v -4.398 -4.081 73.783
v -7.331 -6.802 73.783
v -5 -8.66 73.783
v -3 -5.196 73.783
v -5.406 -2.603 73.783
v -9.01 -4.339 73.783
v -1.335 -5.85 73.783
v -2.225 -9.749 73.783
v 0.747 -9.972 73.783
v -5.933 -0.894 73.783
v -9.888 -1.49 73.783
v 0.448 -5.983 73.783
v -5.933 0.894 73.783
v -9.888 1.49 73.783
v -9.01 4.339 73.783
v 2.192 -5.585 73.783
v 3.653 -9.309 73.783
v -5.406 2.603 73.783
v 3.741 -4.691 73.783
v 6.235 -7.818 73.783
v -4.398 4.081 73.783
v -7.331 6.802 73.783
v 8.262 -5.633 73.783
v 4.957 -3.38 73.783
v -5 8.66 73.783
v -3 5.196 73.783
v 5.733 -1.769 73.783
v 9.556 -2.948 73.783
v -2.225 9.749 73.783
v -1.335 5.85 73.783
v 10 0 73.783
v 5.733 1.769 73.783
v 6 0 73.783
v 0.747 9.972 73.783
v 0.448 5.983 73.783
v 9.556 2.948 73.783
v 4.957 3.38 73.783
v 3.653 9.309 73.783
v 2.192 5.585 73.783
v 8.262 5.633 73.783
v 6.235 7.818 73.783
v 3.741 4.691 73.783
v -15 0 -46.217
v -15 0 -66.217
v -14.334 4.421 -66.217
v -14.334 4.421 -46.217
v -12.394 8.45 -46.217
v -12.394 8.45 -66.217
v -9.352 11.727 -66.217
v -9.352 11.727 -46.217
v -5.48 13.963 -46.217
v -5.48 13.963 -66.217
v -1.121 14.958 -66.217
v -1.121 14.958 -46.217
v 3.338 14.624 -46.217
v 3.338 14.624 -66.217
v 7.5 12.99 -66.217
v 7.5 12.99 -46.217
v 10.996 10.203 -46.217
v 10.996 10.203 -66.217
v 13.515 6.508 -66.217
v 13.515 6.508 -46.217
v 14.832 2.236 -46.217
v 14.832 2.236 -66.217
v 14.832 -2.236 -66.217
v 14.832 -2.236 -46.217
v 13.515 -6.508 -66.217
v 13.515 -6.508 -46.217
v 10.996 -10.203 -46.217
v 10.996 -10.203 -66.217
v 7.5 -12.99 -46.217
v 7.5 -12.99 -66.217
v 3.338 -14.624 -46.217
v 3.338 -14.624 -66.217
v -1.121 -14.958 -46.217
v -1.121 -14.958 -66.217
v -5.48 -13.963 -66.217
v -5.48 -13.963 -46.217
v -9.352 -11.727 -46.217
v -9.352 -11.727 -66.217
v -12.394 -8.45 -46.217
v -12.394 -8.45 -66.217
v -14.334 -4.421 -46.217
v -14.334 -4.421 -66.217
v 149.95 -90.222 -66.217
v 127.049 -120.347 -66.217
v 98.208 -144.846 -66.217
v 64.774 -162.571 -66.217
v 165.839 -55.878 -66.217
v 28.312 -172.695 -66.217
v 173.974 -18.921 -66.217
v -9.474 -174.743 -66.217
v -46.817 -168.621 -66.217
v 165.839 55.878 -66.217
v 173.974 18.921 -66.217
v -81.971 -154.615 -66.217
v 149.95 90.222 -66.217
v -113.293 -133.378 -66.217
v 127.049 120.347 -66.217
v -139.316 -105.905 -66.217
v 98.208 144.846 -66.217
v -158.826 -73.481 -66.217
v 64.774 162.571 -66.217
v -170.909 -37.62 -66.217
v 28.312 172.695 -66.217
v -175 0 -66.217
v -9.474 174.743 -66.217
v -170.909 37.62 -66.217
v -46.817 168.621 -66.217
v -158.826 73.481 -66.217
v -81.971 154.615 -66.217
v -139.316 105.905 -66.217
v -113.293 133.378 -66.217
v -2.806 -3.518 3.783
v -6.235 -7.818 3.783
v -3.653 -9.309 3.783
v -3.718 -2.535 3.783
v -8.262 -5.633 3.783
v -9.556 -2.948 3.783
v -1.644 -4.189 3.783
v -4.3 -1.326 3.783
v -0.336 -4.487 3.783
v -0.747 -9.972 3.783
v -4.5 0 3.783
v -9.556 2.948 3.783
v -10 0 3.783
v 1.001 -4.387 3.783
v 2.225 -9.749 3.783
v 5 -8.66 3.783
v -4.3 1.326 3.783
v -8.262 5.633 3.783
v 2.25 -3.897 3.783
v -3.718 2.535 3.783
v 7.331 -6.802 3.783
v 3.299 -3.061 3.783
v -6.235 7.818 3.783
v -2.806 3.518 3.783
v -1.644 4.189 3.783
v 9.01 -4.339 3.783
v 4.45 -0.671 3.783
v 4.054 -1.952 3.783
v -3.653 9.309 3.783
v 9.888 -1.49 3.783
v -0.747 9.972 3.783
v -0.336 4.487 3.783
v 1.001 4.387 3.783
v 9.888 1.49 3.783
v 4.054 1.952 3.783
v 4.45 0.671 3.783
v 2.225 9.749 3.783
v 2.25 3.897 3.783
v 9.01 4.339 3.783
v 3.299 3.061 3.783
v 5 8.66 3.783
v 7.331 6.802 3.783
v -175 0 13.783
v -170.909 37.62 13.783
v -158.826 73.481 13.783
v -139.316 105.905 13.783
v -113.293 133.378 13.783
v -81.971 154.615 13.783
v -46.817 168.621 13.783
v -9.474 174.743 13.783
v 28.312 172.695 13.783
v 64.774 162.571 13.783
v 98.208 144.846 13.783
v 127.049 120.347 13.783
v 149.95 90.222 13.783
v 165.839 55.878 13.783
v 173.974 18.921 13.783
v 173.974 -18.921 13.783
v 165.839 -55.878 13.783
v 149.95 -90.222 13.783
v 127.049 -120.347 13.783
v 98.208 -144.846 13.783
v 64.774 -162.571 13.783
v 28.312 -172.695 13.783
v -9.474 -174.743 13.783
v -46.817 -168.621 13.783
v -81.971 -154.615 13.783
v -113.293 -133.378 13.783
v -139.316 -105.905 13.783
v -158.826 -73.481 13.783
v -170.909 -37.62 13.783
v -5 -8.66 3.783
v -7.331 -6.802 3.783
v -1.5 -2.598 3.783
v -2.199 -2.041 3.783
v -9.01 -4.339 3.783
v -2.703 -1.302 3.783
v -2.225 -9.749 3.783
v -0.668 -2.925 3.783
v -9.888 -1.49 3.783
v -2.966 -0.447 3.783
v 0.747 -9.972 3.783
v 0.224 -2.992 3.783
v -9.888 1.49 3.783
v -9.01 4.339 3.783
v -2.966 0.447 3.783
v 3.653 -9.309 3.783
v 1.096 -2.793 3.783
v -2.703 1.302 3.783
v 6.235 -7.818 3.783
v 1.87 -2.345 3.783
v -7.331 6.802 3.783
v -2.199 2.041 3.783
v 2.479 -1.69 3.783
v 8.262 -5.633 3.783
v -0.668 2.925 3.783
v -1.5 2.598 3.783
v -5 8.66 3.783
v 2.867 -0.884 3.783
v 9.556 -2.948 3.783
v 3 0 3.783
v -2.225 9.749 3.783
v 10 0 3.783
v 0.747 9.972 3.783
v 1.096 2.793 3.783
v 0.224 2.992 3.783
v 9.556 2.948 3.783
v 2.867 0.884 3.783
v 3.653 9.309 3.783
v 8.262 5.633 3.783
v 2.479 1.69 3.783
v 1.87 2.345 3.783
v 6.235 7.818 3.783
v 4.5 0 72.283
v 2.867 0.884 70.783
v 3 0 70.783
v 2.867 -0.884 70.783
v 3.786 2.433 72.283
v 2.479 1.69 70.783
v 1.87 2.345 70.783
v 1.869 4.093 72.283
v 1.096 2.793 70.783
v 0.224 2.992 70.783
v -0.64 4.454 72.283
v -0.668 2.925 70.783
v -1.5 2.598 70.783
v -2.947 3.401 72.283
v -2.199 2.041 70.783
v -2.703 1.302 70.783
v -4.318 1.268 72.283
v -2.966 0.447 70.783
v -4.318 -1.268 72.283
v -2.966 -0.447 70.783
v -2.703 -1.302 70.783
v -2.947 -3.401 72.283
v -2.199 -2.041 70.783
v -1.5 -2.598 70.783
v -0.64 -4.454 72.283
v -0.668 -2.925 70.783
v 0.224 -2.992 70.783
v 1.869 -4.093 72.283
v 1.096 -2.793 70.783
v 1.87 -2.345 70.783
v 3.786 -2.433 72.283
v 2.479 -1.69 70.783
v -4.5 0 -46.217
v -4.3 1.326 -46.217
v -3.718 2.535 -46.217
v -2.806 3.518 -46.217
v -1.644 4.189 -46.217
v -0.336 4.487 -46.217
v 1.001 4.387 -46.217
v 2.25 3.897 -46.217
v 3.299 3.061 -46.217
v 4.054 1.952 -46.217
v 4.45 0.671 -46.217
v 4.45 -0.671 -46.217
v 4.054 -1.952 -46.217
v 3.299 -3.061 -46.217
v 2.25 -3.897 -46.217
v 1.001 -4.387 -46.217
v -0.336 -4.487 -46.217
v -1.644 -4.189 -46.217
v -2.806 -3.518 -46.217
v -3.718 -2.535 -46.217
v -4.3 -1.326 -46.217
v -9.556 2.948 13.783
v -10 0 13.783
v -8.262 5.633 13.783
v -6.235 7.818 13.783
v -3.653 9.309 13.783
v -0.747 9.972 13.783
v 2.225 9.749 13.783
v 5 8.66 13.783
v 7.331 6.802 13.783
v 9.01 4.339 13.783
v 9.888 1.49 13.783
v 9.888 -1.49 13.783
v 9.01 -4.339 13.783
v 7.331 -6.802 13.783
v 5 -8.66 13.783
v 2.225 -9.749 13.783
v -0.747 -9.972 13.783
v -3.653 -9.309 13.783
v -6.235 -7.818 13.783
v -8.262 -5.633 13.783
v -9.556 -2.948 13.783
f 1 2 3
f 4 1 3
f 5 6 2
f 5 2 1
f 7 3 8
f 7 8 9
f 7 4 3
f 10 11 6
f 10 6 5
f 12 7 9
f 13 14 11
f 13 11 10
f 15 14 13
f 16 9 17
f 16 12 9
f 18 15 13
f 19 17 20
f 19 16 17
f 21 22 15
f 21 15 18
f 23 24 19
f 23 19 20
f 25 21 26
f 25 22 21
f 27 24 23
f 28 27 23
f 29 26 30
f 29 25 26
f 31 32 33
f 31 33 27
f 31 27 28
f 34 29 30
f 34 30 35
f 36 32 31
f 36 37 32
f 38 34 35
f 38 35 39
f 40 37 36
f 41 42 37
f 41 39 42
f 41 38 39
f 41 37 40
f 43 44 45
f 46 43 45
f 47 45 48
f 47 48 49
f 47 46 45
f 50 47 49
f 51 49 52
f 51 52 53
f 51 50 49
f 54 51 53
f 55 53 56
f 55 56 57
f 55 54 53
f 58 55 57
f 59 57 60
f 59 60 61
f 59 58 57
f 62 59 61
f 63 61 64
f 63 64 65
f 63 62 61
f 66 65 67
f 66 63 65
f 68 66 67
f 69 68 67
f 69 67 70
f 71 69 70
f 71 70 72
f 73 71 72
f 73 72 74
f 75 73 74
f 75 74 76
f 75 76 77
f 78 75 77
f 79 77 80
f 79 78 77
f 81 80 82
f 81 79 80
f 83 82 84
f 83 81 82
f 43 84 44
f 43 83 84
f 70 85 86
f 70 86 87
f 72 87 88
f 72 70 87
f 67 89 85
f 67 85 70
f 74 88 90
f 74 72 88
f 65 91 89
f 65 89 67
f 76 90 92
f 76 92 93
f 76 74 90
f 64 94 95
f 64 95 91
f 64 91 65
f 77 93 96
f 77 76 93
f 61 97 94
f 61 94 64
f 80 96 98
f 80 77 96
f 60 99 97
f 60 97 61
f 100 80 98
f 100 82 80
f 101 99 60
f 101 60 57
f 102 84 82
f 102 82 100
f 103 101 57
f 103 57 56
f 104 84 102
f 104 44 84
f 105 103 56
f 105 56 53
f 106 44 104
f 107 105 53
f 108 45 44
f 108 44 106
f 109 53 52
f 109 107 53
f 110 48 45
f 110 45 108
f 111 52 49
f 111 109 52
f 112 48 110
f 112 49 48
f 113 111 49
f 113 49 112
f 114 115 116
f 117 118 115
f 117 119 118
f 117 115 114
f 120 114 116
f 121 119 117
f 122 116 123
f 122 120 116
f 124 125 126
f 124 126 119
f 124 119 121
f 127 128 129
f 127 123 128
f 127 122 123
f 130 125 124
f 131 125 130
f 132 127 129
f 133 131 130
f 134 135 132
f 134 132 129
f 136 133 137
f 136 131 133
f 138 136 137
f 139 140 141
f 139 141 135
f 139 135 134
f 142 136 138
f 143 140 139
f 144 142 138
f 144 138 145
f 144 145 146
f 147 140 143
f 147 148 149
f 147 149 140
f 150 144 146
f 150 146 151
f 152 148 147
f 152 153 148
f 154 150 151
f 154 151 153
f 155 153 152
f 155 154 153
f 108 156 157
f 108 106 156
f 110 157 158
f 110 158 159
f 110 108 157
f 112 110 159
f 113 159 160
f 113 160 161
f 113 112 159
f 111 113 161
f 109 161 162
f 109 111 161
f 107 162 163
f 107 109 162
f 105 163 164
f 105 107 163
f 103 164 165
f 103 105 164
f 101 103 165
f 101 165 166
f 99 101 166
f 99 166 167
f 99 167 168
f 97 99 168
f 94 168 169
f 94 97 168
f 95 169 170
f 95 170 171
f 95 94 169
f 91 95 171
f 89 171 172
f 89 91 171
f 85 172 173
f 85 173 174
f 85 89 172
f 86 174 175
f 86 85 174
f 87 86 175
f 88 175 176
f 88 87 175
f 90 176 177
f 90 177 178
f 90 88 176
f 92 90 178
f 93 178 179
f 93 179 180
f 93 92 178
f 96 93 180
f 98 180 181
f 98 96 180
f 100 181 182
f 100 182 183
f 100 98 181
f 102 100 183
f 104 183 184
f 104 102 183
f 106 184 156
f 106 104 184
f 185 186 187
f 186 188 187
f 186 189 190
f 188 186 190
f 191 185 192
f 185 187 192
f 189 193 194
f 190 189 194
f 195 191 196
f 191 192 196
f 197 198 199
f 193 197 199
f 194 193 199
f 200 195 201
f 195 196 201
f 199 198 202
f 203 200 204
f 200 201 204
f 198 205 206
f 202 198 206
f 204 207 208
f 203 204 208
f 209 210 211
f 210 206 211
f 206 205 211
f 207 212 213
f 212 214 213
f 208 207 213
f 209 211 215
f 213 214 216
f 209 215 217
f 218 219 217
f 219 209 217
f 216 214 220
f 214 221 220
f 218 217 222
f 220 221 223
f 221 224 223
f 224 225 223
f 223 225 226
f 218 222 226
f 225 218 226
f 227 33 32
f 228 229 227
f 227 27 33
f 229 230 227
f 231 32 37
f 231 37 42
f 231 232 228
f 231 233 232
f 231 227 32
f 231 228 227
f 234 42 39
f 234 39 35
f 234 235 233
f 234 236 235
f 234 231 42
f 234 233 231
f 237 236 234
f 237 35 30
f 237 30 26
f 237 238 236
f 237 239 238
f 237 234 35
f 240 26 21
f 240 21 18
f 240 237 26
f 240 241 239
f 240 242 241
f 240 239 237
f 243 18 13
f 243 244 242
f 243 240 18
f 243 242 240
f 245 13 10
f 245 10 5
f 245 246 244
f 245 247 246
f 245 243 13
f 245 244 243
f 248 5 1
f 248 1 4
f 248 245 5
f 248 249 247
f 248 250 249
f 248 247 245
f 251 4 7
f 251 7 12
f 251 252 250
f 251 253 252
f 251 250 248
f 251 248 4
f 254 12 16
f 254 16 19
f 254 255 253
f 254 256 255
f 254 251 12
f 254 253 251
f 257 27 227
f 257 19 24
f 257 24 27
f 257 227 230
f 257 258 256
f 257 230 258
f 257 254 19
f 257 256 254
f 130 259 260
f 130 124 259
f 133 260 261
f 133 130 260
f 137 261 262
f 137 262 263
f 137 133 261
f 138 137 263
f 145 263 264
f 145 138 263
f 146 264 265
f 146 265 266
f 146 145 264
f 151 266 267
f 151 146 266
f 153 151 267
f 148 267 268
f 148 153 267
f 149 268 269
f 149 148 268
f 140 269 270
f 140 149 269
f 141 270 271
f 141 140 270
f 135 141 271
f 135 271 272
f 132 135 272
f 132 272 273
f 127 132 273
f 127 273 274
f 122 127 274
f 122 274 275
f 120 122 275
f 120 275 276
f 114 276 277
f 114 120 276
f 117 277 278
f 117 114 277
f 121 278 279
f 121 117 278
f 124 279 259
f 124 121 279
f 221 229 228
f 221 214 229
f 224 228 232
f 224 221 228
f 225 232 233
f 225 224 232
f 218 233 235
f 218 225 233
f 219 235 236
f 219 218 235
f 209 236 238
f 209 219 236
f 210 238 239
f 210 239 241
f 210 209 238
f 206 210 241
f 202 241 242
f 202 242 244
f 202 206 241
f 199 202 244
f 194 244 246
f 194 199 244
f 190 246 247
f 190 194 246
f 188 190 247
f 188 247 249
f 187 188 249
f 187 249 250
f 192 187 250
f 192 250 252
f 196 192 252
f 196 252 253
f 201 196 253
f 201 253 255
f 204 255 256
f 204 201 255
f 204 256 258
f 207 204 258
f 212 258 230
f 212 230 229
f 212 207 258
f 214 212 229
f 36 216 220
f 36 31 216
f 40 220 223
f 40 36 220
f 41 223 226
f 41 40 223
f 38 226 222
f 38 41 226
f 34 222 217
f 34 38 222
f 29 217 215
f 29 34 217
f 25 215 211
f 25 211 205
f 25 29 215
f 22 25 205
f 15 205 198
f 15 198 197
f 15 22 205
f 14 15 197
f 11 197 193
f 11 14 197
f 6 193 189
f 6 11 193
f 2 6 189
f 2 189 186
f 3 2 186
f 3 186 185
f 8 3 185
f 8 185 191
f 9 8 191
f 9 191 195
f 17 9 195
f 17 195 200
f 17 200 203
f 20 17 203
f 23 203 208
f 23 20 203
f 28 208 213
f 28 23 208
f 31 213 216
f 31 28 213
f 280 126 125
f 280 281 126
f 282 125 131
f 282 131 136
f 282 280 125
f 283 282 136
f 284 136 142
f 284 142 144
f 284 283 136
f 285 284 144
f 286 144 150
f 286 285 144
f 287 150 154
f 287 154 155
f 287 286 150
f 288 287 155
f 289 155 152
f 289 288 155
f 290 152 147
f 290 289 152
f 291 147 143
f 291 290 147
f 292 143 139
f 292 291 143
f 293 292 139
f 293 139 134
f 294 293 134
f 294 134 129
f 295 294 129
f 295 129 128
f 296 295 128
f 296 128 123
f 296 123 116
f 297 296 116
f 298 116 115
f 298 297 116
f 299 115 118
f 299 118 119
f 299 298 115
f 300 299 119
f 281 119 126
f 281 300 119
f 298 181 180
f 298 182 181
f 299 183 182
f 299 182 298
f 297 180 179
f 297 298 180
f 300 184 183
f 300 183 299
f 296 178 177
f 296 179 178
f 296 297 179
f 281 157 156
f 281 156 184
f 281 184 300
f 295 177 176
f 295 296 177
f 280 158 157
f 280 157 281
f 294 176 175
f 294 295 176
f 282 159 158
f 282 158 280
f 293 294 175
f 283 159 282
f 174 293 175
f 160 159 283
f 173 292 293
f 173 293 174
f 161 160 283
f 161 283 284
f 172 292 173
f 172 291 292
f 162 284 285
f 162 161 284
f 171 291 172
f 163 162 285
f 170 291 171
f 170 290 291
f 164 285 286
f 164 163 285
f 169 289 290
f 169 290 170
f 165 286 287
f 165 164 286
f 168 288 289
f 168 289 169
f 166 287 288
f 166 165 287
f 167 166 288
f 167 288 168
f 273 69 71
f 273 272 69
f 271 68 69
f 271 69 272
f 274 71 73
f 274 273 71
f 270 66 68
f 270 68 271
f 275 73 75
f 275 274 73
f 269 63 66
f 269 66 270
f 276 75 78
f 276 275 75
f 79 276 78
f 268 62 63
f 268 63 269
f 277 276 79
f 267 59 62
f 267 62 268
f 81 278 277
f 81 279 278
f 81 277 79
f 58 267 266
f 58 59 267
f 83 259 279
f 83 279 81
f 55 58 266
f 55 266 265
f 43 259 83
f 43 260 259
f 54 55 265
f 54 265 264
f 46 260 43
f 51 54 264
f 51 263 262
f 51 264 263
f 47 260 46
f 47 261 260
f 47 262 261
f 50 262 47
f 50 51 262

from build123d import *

# Parameters (mm, degrees)
F2_R          = 10
F2_R_2        = 3
F3_DEPTH      = 60
F3_DEPTH_BACK = 10
F4_SIZE       = 3


with BuildPart() as f1:
    # F0 (on Front) → F1 (revolve)
    with BuildSketch(Plane.XZ):
        Polygon((-10, 3.782501), (-10, 13.782501), (-175, 13.782501), (-175, -66.217499), (-15, -66.217499), (-15, -46.217499), (-4.5, -46.217499), (-4.5, 3.782501), align=None)
    revolve(axis=Axis((0, 0, 9.751017), (0, 0, -1)))


with BuildPart() as f3:
    # F2 (on face) → F3 (new body, two sides)
    with BuildSketch(Plane.XY.offset(13.782501)) as f3_sk:
        Circle(F2_R)
        Circle(F2_R_2, mode=Mode.SUBTRACT)
    extrude(amount=F3_DEPTH)
    extrude(f3_sk.sketch, amount=-F3_DEPTH_BACK)

    # F4
    f4_edges = [f3.edges().sort_by_distance(p)[0] for p in [
        (-3, 0, 73.782501),
    ]]
    chamfer(f4_edges, length=F4_SIZE)


solid = Compound([f1.part, f3.part])
